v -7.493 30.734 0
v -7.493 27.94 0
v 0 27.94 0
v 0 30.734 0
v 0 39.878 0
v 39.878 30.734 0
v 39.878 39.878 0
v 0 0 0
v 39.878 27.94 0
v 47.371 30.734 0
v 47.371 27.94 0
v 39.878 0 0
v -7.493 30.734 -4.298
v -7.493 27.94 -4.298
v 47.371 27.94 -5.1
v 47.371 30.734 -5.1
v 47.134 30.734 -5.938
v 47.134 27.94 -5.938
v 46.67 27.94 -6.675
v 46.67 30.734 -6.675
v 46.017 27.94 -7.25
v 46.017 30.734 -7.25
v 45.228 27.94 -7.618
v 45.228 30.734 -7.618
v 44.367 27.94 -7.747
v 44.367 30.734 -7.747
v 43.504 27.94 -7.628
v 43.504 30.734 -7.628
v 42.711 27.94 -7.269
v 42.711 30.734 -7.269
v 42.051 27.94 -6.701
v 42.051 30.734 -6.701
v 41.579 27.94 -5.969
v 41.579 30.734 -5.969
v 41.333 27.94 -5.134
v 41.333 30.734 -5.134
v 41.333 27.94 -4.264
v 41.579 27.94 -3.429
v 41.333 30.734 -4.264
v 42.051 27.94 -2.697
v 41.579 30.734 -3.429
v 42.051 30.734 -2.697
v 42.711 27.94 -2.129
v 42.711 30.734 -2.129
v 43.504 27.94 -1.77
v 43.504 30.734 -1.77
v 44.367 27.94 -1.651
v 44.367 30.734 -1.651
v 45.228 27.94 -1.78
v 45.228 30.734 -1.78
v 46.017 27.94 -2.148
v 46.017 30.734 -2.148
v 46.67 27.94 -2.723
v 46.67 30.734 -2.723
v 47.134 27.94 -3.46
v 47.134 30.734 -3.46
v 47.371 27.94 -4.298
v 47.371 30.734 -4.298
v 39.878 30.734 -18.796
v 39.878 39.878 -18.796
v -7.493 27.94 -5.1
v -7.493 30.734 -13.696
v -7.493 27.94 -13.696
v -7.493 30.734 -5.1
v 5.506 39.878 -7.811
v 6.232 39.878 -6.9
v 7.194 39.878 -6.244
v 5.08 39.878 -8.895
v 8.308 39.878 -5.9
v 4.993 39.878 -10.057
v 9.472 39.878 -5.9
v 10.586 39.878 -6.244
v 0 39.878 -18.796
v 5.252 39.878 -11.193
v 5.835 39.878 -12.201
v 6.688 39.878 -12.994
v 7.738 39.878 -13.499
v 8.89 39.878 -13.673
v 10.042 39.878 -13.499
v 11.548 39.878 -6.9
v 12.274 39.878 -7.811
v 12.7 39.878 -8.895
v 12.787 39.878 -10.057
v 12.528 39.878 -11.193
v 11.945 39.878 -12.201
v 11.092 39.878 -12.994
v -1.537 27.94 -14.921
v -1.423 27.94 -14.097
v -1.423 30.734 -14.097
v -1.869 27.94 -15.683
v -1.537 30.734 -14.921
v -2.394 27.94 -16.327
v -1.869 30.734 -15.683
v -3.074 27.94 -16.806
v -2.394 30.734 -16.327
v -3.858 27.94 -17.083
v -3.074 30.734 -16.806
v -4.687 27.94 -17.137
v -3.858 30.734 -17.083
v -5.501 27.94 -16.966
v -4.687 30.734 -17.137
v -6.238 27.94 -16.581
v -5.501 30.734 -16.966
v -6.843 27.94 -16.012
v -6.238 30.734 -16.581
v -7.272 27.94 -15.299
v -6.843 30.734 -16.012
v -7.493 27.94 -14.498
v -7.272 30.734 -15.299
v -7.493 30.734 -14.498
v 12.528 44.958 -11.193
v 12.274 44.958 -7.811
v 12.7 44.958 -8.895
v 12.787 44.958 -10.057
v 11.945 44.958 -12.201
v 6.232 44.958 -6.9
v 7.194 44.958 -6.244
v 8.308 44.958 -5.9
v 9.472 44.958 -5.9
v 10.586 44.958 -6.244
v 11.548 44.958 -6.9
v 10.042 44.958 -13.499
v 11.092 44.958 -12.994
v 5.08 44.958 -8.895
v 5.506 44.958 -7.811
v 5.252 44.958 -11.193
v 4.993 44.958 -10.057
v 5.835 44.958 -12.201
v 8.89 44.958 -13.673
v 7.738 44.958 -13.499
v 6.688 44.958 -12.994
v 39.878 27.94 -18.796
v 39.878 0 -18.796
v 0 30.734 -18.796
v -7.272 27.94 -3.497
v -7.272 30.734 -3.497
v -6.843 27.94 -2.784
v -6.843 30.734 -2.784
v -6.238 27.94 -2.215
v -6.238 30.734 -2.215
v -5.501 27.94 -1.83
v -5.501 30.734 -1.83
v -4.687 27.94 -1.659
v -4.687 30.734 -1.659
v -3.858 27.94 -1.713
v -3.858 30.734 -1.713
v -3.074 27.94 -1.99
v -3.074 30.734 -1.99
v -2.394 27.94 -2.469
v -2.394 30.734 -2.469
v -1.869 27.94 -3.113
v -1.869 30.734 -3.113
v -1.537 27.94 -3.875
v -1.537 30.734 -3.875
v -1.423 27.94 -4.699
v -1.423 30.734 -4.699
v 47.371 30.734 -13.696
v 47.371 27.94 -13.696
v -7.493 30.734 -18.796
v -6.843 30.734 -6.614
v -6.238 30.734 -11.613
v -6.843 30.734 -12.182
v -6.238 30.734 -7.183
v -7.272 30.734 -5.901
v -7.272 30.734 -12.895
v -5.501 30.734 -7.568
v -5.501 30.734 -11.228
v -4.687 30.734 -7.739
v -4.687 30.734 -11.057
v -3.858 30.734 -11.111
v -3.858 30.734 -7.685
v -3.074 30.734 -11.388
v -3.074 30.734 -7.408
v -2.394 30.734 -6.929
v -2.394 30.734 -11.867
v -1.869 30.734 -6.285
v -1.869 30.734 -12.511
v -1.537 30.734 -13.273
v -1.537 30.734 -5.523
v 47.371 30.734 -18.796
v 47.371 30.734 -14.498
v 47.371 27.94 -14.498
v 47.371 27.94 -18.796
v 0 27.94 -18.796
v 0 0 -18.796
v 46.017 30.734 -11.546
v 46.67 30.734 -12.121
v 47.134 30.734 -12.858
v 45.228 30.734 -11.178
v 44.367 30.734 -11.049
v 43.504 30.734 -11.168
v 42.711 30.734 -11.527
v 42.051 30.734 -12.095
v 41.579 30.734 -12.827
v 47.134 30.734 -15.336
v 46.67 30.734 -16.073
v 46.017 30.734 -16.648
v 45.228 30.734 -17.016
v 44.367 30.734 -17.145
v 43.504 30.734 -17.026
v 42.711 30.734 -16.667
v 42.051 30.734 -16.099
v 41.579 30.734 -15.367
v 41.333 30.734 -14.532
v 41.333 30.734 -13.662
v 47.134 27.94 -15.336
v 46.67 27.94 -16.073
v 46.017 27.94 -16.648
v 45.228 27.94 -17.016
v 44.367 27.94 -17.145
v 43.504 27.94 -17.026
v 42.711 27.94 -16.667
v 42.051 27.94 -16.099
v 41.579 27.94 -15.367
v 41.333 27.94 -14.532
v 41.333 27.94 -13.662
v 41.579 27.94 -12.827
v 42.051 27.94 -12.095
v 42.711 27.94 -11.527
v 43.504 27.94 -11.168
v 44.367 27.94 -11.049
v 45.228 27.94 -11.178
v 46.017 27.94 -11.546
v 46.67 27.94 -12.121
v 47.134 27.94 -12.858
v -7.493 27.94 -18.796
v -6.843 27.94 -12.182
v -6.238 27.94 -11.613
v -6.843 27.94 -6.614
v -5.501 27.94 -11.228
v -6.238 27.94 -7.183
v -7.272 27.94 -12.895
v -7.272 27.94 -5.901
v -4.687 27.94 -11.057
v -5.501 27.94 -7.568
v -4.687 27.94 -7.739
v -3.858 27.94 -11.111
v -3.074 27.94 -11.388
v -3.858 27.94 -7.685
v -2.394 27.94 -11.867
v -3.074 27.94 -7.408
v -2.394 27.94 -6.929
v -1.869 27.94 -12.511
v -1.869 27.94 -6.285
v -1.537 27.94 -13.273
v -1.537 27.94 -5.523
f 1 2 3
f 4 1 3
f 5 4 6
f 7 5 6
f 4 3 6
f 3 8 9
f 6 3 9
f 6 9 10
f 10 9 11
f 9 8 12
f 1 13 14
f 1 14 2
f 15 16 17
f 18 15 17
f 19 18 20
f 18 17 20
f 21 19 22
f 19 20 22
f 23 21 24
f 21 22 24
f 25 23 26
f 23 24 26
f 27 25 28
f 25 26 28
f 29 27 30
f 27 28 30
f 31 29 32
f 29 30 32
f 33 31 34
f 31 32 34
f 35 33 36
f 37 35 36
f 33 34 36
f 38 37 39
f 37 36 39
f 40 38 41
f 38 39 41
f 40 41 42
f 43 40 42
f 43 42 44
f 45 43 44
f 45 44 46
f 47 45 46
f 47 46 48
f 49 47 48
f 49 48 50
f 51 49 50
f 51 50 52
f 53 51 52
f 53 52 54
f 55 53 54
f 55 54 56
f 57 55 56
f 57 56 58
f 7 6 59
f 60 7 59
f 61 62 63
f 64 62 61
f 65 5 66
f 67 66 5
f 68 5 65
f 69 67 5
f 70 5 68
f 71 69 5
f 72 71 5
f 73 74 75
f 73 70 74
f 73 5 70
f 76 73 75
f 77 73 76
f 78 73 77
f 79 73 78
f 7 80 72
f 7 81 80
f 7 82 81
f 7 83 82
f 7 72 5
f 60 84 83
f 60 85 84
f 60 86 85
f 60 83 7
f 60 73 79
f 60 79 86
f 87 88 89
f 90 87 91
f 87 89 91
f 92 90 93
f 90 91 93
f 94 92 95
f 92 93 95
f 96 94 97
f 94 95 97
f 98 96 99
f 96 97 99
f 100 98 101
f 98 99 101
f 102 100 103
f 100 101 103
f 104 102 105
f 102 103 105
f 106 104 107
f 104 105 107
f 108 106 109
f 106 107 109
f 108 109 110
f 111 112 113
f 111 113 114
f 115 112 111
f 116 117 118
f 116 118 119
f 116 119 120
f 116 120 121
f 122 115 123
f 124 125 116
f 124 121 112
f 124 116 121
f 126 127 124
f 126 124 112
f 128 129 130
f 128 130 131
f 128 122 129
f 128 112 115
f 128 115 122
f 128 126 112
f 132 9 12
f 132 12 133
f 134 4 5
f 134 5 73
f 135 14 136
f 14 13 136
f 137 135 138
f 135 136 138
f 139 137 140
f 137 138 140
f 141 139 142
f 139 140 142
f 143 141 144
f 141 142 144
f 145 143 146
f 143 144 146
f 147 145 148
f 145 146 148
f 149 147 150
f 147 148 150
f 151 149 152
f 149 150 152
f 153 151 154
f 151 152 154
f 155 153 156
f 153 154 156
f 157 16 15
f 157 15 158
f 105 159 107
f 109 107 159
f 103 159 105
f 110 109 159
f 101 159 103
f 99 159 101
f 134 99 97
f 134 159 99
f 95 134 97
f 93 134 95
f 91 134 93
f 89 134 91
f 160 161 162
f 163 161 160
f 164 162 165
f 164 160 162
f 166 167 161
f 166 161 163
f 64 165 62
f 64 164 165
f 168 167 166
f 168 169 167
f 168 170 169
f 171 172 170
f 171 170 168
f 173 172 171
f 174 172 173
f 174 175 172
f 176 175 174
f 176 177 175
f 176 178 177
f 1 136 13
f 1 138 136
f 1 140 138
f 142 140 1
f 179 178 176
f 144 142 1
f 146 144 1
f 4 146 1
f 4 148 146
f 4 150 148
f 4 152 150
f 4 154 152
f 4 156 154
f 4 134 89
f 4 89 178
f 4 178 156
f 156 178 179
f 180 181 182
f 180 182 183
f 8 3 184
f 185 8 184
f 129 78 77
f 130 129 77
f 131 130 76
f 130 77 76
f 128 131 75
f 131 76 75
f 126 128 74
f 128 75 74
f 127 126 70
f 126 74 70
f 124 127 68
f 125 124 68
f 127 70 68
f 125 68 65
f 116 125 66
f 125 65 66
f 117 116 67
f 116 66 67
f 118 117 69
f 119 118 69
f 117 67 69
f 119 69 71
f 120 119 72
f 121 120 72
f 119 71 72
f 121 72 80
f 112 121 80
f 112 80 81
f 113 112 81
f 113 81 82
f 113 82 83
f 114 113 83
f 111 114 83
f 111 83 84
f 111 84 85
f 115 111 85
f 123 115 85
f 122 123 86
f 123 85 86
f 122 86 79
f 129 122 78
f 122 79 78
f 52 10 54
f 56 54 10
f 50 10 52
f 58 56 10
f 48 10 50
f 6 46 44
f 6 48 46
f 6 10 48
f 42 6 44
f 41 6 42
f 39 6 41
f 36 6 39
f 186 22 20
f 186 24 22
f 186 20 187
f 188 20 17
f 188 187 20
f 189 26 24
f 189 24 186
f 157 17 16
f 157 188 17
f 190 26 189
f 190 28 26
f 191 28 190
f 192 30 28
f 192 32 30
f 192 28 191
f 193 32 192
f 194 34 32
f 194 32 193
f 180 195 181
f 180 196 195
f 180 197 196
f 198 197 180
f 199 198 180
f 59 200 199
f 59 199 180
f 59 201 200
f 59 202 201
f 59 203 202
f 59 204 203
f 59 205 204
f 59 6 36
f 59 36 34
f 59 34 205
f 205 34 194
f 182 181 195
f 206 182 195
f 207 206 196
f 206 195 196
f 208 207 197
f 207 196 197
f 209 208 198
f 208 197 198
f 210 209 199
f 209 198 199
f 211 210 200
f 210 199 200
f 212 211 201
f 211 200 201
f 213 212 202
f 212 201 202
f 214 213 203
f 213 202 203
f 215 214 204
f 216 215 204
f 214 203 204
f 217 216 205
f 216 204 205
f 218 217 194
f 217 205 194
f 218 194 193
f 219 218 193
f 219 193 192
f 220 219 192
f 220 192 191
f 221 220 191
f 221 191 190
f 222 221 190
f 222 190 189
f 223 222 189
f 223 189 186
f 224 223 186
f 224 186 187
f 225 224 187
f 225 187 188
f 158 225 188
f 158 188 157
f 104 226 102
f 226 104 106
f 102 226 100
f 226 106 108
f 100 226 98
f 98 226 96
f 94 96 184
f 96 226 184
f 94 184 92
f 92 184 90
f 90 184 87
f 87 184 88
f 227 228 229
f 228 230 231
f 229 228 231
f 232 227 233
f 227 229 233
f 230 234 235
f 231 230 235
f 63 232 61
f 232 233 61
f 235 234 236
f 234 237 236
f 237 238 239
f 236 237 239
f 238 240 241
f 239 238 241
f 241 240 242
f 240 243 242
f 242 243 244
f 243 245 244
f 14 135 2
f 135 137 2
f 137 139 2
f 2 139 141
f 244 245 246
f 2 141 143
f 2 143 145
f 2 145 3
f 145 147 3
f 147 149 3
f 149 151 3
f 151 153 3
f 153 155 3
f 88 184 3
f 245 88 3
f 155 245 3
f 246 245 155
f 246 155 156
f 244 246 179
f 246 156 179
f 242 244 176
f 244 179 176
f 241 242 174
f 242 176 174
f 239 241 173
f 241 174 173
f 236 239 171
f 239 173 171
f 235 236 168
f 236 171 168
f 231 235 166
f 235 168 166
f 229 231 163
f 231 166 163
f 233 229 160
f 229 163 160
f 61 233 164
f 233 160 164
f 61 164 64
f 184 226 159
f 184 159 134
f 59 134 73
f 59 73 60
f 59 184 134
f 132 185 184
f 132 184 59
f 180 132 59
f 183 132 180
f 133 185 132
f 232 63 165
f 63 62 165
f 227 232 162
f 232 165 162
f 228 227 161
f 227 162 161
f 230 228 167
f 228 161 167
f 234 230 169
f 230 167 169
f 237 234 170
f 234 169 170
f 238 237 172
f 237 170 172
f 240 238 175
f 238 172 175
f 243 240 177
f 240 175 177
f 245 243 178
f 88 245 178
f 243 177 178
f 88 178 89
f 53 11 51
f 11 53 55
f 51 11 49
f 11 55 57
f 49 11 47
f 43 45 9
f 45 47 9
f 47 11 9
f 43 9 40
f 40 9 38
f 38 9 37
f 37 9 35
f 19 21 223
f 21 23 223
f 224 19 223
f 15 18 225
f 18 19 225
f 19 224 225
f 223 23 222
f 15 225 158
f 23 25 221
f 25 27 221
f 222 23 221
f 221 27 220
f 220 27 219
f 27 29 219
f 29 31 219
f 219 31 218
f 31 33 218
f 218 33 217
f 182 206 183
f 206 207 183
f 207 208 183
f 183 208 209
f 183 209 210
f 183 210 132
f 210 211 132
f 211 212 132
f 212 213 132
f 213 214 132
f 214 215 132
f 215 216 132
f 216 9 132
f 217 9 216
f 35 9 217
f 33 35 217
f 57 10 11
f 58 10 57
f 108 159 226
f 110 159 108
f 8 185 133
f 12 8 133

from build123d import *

# Parameters (mm, degrees)
SKETCH1_W           = 39.878
SKETCH1_H           = 18.796
BOSS_EXTRUDE1_DEPTH = 39.878
SKETCH2_W           = 18.796
SKETCH2_H           = 2.794
BOSS_EXTRUDE2_DEPTH = 7.493
SKETCH3_W           = 18.796
SKETCH3_H           = 2.794
BOSS_EXTRUDE3_DEPTH = 7.493
SKETCH6_R           = 3.908083023
BOSS_EXTRUDE5_DEPTH = 5.08
SKETCH7_R           = 3.048
CUT_EXTRUDE1_DEPTH  = 5.08


with BuildPart() as part:
    # Sketch1 → Boss-Extrude1 (new body)
    with BuildSketch(Plane(origin=(0, 0, 0), x_dir=(1, 0, 0), z_dir=(0, 1, 0))):
        with Locations((19.939, 9.398)):
            Rectangle(SKETCH1_W, SKETCH1_H)
    extrude(amount=BOSS_EXTRUDE1_DEPTH)

    # Sketch2 → Boss-Extrude2 (add)
    with BuildSketch(Plane.ZY):
        with Locations((-9.398, 29.337)):
            Rectangle(SKETCH2_W, SKETCH2_H)
    extrude(amount=BOSS_EXTRUDE2_DEPTH)

    # Sketch3 → Boss-Extrude3 (add)
    with BuildSketch(Plane(origin=(39.878, 0, 0), x_dir=(0, 0, -1), z_dir=(1, 0, 0))):
        with Locations((9.398, 29.337)):
            Rectangle(SKETCH3_W, SKETCH3_H)
    extrude(amount=BOSS_EXTRUDE3_DEPTH)

    # Sketch6 → Boss-Extrude5 (add)
    with BuildSketch(Plane(origin=(0, 39.878, 0), x_dir=(1, 0, 0), z_dir=(0, 1, 0))):
        with Locations(Location((8.89, 9.764757061, 0), (0, 0, 90))):
            Circle(SKETCH6_R)
    extrude(amount=BOSS_EXTRUDE5_DEPTH)

    # Sketch7 → Cut-Extrude1 (cut)
    with BuildSketch(Plane(origin=(0, 30.734, 0), x_dir=(1, 0, 0), z_dir=(0, 1, 0))):
        with Locations((-4.471485828, 14.097)):
            Circle(SKETCH7_R)
        with Locations((-4.471485828, 4.699)):
            Circle(SKETCH7_R)
        with Locations((44.349485828, 4.699)):
            Circle(SKETCH7_R)
        with Locations((44.349485828, 14.097)):
            Circle(SKETCH7_R)
    extrude(amount=-CUT_EXTRUDE1_DEPTH, mode=Mode.SUBTRACT)


solid = part.part
